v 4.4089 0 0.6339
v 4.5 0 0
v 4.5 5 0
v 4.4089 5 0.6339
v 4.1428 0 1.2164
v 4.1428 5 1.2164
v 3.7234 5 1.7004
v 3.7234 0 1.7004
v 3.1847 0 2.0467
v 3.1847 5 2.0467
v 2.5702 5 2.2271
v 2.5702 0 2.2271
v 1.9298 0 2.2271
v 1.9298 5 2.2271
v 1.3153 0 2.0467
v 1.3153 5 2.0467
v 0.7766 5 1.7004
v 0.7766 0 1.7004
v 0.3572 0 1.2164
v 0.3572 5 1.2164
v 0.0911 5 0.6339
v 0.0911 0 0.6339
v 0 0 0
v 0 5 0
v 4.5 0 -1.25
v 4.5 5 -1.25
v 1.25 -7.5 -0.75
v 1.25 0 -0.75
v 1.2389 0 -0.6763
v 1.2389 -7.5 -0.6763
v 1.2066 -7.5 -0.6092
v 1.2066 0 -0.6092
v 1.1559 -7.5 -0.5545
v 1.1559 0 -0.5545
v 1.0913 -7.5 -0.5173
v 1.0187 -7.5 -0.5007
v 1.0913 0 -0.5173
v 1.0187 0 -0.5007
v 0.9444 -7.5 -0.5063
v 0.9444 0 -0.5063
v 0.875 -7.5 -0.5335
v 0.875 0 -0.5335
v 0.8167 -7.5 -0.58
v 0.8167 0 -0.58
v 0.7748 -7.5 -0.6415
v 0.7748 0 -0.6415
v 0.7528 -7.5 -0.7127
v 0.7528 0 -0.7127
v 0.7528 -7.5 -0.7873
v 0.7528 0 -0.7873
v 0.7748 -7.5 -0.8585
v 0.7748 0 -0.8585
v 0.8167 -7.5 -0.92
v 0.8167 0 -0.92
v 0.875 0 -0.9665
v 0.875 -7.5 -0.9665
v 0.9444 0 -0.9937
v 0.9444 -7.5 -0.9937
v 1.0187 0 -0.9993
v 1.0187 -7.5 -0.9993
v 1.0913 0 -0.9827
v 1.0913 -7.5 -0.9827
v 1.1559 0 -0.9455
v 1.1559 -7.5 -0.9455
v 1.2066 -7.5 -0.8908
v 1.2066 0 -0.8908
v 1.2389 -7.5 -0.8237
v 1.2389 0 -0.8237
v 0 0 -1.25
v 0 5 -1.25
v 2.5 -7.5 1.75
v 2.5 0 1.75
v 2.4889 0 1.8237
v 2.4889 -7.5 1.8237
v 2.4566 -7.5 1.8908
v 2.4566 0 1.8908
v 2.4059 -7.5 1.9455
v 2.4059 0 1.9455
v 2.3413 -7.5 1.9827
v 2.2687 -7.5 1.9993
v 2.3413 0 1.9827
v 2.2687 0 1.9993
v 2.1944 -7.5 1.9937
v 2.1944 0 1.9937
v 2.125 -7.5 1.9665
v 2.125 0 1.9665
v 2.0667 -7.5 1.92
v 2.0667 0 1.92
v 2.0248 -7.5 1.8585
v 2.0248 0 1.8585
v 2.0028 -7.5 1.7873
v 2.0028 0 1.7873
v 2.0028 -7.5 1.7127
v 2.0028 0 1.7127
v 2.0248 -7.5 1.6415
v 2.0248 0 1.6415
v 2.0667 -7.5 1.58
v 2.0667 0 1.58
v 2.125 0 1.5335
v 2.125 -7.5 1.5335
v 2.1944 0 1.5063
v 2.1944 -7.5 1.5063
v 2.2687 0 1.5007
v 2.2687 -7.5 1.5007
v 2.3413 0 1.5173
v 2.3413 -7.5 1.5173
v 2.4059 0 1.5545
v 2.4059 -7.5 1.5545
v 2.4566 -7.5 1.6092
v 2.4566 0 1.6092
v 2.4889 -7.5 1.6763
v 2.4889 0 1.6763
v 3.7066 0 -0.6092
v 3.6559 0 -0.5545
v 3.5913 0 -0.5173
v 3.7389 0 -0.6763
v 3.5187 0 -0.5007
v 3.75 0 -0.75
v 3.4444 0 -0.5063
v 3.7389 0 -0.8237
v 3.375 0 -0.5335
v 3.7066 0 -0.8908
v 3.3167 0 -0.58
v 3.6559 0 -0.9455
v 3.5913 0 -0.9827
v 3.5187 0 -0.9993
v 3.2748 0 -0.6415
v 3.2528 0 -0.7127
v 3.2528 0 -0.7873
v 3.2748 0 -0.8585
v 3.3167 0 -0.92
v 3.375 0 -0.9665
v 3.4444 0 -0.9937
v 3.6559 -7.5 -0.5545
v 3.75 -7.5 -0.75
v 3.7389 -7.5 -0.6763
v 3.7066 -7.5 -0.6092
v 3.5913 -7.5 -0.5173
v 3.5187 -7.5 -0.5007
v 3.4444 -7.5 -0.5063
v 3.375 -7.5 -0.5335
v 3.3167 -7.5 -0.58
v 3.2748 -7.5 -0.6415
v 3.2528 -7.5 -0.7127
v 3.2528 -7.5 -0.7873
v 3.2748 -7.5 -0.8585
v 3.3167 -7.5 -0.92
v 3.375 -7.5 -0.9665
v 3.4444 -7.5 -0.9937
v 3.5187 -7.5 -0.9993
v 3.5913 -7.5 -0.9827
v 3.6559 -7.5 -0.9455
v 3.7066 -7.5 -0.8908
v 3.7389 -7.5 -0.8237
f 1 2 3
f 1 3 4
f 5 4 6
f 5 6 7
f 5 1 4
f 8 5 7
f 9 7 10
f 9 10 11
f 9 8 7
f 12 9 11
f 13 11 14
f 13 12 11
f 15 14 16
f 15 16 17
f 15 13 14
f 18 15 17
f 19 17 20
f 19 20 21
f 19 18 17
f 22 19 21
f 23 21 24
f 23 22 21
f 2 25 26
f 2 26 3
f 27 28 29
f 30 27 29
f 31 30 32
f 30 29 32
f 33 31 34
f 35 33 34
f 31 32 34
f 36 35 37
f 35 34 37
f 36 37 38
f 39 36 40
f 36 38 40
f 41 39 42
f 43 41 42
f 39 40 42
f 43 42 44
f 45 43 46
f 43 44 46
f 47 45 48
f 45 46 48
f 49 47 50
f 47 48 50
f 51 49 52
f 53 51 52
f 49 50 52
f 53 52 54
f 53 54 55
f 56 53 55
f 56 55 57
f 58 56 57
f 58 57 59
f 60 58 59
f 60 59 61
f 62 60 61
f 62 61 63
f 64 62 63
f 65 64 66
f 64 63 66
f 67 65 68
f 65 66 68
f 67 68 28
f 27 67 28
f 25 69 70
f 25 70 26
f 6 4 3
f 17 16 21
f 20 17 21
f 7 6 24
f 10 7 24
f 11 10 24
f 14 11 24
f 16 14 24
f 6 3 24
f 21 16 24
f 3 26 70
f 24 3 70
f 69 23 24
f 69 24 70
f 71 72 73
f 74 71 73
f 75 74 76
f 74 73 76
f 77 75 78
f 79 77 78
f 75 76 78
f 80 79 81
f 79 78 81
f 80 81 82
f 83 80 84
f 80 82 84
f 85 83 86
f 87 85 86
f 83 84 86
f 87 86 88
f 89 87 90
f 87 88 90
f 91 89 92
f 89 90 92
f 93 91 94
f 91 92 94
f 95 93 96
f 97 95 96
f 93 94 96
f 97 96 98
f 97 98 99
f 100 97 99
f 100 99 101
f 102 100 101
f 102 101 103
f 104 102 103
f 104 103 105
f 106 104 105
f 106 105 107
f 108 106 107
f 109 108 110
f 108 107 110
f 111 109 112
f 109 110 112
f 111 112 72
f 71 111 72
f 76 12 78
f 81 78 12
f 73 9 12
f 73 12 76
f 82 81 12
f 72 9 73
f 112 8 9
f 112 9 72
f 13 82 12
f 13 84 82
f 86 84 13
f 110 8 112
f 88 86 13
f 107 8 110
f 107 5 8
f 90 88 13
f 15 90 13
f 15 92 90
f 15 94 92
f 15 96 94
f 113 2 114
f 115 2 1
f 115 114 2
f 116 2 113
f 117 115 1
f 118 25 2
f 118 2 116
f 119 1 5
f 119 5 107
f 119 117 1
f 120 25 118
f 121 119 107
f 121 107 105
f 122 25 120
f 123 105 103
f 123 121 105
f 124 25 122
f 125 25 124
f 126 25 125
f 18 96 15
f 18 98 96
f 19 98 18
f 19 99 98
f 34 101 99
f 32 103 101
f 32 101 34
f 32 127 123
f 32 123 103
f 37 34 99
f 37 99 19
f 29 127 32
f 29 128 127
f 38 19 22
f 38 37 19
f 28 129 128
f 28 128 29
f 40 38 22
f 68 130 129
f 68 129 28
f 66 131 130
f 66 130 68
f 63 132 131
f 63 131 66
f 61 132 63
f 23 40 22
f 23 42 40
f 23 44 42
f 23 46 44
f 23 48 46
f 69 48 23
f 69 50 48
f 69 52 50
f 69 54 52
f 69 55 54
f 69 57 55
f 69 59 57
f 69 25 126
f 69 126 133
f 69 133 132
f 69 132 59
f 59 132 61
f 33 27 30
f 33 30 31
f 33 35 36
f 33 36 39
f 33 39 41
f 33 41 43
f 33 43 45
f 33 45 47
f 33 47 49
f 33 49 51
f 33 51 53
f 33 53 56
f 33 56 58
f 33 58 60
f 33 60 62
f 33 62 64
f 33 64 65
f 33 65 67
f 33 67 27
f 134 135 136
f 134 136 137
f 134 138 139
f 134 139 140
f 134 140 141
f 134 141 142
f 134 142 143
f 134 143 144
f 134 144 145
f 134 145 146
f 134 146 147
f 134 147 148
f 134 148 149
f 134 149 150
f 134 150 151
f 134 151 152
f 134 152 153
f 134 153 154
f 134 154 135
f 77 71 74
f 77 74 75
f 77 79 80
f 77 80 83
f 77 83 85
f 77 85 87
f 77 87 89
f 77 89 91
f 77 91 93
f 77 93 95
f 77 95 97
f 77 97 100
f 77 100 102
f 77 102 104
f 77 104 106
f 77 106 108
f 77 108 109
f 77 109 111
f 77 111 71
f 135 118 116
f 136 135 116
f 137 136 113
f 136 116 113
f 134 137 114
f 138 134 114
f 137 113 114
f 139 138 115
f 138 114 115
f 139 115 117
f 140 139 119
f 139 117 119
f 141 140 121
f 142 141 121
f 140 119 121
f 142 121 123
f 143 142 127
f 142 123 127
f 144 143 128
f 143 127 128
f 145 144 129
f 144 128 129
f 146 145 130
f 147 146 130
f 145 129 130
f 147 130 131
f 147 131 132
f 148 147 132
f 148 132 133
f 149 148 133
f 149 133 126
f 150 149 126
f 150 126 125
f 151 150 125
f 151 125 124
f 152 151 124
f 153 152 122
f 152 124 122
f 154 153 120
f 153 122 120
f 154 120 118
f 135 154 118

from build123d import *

# Parameters (mm, degrees)
BOSS_EXTRUDE1_DEPTH = 5
SKETCH2_R           = 0.25
BOSS_EXTRUDE2_DEPTH = 7.5


with BuildPart() as part:
    # Sketch1 → Boss-Extrude1 (new body)
    with BuildSketch(Plane(origin=(0, 0, 0), x_dir=(1, 0, 0), z_dir=(0, 1, 0))):
        with BuildLine():
            Line((0, 1.25), (4.5, 1.25))
            Line((4.5, 1.25), (4.5, 0))
            ThreePointArc((4.5, 0), (2.25, -2.25), (0, 0))
            Line((0, 0), (0, 1.25))
        make_face()
    extrude(amount=BOSS_EXTRUDE1_DEPTH)

    # Sketch2 → Boss-Extrude2 (add)
    with BuildSketch(Plane.XZ):
        with Locations((1, -0.75)):
            Circle(SKETCH2_R)
        with Locations((3.5, -0.75)):
            Circle(SKETCH2_R)
        with Locations((2.25, 1.75)):
            Circle(SKETCH2_R)
    extrude(amount=BOSS_EXTRUDE2_DEPTH)


solid = part.part
